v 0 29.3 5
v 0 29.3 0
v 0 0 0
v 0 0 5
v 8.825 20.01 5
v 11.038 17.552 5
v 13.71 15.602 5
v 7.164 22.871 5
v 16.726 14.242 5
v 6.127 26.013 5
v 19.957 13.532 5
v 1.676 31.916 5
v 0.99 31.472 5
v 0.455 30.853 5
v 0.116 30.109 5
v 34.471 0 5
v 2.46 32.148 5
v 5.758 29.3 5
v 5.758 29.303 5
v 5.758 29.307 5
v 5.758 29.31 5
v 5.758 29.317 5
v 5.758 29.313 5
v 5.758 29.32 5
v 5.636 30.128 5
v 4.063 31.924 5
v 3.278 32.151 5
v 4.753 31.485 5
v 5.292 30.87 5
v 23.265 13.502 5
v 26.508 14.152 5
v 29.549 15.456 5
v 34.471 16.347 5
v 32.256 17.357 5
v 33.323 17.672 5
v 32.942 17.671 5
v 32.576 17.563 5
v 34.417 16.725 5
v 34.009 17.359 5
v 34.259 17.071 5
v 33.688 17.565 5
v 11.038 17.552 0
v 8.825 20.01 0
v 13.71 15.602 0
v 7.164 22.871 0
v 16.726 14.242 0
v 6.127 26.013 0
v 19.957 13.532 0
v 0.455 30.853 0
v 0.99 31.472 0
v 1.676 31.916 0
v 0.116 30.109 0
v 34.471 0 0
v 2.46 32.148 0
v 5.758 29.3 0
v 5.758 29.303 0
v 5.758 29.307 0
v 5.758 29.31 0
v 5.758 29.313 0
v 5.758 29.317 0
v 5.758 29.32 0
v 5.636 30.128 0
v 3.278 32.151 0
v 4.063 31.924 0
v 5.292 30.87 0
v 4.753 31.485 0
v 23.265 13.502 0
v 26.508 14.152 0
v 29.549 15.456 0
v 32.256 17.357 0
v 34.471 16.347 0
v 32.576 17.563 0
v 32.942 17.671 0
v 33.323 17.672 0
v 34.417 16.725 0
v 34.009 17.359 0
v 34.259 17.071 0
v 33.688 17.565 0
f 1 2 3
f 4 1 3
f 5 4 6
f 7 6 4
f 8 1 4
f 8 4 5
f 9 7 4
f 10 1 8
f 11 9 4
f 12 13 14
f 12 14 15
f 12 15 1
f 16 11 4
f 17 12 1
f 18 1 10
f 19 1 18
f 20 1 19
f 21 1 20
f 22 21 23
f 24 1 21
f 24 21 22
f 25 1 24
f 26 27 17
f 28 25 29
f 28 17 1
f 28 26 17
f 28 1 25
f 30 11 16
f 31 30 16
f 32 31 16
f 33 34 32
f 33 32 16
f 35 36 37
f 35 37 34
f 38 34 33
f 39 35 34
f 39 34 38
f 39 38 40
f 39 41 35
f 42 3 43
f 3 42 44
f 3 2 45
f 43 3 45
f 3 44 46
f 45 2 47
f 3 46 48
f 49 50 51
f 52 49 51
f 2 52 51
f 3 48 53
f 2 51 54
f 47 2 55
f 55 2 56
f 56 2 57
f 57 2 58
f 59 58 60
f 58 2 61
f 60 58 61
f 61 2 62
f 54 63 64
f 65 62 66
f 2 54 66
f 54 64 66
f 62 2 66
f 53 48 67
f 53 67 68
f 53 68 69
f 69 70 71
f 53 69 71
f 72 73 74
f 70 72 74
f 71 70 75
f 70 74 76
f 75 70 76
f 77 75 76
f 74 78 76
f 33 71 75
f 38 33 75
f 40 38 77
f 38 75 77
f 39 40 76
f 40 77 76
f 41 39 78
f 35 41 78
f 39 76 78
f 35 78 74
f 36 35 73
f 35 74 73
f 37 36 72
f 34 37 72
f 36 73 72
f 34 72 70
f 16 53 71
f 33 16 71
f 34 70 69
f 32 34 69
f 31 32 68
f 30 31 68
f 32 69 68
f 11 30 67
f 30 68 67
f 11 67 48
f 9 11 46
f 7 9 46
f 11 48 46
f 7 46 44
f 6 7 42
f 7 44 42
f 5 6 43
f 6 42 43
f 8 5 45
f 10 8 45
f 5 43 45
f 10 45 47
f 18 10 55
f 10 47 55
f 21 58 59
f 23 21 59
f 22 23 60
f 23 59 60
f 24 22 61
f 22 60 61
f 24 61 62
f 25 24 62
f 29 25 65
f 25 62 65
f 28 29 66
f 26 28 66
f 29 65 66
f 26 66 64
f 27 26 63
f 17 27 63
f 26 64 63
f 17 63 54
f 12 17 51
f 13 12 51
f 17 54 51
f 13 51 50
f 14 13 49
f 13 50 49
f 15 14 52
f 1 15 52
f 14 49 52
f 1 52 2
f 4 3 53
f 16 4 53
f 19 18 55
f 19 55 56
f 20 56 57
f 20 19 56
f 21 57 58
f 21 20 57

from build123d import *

# Parameters (mm, degrees)
F1_DEPTH = 5
F3_DEPTH = 5


# Not quite as in the source:
# - ends of sketch curves that miss each other by under 0.0002 mm in the source are joined
# - a feature names something its author has since deleted; it is built from what else it names


with BuildPart() as f1:
    # F0 (on Top) → F1 (new body)
    with BuildSketch(Plane.XY):
        with BuildLine():
            Line((0, 29.2999204248), (0, 0))
            Line((0, 0), (34.4714387385, 0))
            Line((34.4714387385, 0), (34.4714387385, 16.3473710418))
            ThreePointArc((34.4714387385, 16.3473710418), (32.5790927131, 15.1300794804), (32.2559916738, 17.3568210333))
            ThreePointArc((32.2559916738, 17.3568210333), (15.182844974, 14.8438668457), (5.7578901922, 29.2999210911))
            ThreePointArc((5.7578901922, 29.2999210911), (2.8789043427, 26.4210160822), (0, 29.2999204248))
        make_face()
        with BuildLine():
            ThreePointArc((5.7577396052, 29.3198639813), (2.8689325046, 32.1788074974), (0, 29.2999204248))
            ThreePointArc((0, 29.2999204248), (2.8789043427, 26.4210160822), (5.7578086853, 29.2999204248))
            ThreePointArc((5.7578086853, 29.2999204248), (5.7578117914, 29.3098925127), (5.7577396052, 29.3198639813))
        make_face()
        with BuildLine():
            ThreePointArc((32.2559916738, 17.3568210333), (32.5790927131, 15.1300794804), (34.4714387385, 16.3473710418))
            ThreePointArc((34.4714387385, 16.3473710418), (33.6883902233, 17.5646626032), (32.2559916738, 17.3568210333))
        make_face()
    extrude(amount=F1_DEPTH)

    # F2 (on face) → F3 (join)
    with BuildSketch(Plane.XY.offset(5)):
        with BuildLine():
            ThreePointArc((34.4714387385, 16.3473710418), (33.6883902233, 17.5646626032), (32.2559916738, 17.3568210333))
            ThreePointArc((32.2559916738, 17.3568210333), (15.182844974, 14.8438668457), (5.7578901922, 29.2999210911))
            ThreePointArc((5.7578901922, 29.2999210911), (5.757811792, 29.3098923335), (5.7577396052, 29.3198639813))
            ThreePointArc((5.7577396052, 29.3198639813), (2.8689325046, 32.1788074974), (0, 29.2999204248))
            Line((0, 29.2999204248), (0, 0))
            Line((0, 0), (34.4714387385, 0))
            Line((34.4714387385, 0), (34.4714387385, 16.3473710418))
        make_face()
    extrude(amount=-F3_DEPTH)


solid = f1.part
